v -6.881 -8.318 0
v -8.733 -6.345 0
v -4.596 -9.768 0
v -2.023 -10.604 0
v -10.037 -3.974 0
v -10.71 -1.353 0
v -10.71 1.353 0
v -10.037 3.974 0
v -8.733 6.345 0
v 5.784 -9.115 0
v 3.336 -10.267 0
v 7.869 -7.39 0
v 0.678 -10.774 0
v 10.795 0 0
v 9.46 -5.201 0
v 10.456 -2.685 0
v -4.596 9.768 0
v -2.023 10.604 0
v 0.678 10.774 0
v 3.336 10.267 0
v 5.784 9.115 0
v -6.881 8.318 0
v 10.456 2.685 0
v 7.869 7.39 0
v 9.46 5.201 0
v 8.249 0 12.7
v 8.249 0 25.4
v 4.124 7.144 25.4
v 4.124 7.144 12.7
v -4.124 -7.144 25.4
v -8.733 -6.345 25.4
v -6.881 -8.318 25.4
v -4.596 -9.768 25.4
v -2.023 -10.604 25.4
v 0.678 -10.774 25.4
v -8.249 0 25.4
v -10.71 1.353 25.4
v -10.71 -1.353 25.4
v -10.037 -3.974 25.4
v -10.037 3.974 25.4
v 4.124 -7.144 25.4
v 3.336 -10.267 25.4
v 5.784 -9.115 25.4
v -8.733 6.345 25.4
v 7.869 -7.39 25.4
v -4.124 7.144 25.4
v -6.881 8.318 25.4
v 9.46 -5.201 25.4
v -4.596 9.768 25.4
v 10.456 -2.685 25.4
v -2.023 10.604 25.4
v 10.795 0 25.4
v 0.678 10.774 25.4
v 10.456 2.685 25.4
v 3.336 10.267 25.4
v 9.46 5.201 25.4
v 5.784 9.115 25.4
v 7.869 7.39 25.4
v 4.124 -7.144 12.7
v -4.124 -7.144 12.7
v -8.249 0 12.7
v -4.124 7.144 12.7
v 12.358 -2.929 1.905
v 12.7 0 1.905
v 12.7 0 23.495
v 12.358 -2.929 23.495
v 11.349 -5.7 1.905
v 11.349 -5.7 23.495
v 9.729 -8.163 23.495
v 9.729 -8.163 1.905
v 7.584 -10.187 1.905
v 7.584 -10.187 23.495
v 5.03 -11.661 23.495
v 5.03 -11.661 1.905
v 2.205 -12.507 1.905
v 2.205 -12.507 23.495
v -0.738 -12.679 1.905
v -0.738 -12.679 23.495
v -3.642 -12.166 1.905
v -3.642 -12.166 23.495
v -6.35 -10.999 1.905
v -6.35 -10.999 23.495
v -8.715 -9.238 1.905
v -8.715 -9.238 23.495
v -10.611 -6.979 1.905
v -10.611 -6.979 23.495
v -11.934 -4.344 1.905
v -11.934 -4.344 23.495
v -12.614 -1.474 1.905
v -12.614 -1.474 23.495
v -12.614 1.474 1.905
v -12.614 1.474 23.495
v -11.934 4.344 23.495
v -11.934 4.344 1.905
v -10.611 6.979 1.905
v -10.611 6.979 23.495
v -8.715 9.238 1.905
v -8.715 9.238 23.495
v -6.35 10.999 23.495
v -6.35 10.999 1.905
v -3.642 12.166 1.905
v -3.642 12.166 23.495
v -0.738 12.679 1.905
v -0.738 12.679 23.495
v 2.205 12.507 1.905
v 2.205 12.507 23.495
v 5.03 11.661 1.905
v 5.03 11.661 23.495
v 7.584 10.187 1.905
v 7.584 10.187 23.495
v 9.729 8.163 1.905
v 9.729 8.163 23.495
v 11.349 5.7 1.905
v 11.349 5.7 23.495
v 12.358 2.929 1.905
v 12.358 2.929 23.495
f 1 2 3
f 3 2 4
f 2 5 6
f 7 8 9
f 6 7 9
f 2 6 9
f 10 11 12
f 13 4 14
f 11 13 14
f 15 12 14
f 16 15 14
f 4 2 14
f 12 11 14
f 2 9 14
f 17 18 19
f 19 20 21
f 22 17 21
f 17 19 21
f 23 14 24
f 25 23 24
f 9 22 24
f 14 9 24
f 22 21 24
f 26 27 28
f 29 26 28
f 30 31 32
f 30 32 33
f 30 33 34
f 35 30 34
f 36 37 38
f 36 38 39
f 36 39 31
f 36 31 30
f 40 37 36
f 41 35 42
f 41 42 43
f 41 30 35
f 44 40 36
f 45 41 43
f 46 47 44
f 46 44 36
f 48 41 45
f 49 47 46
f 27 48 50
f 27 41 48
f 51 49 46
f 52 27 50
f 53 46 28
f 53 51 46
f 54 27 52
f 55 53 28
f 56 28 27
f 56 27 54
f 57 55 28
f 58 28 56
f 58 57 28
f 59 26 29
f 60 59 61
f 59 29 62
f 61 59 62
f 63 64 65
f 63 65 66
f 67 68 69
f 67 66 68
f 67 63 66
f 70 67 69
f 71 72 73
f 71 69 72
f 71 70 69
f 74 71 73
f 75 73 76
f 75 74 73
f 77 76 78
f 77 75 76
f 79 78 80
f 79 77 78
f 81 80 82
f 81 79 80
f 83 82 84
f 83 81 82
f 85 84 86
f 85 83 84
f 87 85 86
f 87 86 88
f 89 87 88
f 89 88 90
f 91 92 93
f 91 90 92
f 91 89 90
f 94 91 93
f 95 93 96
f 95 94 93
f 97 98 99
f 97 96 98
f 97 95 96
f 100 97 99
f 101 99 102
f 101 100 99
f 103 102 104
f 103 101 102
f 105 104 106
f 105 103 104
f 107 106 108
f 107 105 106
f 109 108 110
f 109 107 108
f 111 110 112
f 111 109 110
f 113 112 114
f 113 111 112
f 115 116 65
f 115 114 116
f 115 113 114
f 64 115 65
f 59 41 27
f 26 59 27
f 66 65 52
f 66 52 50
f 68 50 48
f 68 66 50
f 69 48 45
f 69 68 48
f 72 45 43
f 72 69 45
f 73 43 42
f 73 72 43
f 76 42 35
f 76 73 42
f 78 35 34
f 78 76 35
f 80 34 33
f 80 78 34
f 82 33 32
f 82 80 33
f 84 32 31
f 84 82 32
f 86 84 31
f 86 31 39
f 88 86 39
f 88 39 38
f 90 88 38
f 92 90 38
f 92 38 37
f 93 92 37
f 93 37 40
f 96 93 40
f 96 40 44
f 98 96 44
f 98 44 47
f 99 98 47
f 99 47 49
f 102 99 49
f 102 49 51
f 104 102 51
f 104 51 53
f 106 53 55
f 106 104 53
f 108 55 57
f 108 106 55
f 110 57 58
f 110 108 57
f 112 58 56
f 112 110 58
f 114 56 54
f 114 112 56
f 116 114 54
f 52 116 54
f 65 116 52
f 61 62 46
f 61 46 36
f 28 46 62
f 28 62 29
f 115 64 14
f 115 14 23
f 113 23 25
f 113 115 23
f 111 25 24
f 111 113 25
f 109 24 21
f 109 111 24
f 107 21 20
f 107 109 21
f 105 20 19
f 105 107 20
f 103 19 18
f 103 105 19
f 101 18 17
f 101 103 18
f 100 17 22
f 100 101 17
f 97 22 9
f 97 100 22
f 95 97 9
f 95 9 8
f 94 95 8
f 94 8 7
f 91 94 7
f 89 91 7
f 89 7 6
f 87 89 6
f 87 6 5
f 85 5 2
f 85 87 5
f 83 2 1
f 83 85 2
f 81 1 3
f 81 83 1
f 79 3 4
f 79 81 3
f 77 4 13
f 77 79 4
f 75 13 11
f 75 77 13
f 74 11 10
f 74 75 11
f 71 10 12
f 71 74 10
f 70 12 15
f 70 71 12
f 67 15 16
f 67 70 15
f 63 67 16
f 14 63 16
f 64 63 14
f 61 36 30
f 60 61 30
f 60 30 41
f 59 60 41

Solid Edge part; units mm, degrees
sketch "Sketch1" plane through (0, 0, 0) normal (0, 0, 1) x (1, 0, 0)
  circle A0 centre (0, 0) radius 12.7
  dimension "D1" = 25.4
extrude "Protrusion1" add sketch "Sketch1" along normal blind 25.4
chamfer "Chamfer1" distance 1.905 angle 45 2 edges at (-12.7, 0, 0) (-12.7, 0, 25.4)
sketch "Sketch2" plane through (0, 0, 25.4) normal (0, 0, 1) x (1, 0, 0)
  line L0 (-4.1244, 7.1438) -> (4.1244, 7.1438)
  line L1 (8.2489, 0) -> (4.1244, 7.1437)
  line L2 (4.1244, -7.1437) -> (8.2489, 0)
  line L3 (-4.1244, -7.1438) -> (4.1244, -7.1438)
  line L4 (-8.2489, 0) -> (-4.1244, -7.1437)
  line L5 (-4.1244, 7.1437) -> (-8.2489, 0)
  dimension "D1" = 14.2875
extrude "Cutout1" cut sketch "Sketch2" against normal blind 12.7
properties part number "24103863"
